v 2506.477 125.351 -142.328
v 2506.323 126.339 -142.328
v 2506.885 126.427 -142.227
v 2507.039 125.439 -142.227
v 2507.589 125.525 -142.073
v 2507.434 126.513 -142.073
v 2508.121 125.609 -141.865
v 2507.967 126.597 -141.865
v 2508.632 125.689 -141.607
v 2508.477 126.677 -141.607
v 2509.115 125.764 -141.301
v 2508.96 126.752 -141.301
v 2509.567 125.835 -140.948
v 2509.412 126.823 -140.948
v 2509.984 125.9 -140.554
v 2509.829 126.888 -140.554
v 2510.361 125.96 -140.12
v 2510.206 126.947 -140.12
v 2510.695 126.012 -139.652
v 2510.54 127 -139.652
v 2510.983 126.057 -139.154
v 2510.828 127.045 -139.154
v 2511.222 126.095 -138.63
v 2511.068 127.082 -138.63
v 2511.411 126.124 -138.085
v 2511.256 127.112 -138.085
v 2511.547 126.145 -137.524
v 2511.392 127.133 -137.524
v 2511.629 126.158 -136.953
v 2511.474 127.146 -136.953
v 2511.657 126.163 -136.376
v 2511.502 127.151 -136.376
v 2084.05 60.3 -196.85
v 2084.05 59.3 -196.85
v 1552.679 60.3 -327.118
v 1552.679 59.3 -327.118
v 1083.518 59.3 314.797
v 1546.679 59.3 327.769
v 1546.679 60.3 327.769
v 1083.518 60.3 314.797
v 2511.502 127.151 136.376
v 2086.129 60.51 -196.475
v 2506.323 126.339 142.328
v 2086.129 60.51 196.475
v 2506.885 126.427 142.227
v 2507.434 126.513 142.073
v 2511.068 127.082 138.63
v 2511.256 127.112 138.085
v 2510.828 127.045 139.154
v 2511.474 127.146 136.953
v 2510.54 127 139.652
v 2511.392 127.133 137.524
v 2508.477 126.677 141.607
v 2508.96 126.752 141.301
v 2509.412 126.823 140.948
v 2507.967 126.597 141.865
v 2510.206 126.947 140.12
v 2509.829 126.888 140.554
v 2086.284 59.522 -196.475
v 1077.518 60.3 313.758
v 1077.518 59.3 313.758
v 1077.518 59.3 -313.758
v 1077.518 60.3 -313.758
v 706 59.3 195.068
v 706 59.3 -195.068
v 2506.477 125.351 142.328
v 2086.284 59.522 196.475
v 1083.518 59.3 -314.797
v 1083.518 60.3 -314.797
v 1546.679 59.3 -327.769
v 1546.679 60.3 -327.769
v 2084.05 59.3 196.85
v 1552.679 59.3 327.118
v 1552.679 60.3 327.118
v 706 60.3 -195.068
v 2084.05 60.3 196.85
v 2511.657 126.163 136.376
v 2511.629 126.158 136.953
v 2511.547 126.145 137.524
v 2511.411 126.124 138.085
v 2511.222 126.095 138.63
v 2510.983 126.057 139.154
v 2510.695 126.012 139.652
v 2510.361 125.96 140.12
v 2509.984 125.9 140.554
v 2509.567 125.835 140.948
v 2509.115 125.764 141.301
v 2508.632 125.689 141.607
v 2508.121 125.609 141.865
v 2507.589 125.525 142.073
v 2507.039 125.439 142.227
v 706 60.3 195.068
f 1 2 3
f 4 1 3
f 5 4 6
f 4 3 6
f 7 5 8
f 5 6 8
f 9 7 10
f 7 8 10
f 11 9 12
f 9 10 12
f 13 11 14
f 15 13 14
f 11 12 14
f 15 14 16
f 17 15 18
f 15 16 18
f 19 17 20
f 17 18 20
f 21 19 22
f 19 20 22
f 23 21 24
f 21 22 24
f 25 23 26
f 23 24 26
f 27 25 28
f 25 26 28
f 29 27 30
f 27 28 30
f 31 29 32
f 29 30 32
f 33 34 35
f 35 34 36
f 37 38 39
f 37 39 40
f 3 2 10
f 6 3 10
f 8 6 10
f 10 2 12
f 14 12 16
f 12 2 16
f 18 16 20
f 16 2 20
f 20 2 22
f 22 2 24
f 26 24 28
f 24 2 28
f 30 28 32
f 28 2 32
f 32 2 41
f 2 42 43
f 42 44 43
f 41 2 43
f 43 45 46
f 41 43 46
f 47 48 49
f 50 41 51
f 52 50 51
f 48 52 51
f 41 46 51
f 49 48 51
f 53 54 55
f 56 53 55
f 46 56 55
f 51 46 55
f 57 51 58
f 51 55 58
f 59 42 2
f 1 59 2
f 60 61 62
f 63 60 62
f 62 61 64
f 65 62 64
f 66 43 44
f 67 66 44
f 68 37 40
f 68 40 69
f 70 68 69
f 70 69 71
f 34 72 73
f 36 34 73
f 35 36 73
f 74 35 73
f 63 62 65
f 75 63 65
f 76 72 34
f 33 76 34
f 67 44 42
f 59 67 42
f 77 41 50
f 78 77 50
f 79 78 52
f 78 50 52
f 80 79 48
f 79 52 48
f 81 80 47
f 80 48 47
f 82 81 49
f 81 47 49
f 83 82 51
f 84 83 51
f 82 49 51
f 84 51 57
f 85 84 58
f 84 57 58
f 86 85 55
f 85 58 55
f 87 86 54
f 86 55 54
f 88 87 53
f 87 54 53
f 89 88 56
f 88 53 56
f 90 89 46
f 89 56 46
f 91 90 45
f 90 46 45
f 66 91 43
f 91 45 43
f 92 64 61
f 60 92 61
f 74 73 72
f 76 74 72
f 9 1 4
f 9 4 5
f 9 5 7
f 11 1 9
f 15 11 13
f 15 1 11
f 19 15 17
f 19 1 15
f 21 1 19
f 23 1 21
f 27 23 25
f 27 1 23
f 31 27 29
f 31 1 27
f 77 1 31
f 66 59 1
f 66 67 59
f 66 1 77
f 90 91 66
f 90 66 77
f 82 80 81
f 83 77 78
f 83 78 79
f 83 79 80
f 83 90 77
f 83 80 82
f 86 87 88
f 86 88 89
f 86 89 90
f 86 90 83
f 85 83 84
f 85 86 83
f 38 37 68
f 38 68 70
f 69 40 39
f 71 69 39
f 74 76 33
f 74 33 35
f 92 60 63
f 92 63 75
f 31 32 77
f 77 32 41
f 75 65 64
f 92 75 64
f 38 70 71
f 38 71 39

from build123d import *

# Parameters (mm, degrees)
BOSS_EXTRUDE1_DEPTH         = 1
BOSS_EXTRUDE1_2_DEPTH       = 1
BOSS_EXTRUDE1_3_DEPTH       = 1
BOSS_EXTRUDEREARFLOOR_START = -1
BOSS_EXTRUDEREARFLOOR_DEPTH = 1


with BuildPart() as part:
    # Sketch1 → Boss-Extrude1 (new body)
    with BuildSketch(Plane.XZ.offset(-59.3)):
        Polygon((2084.05, 196.849875822), (2084.05, -196.849875822), (1552.679093518, -327.117712255), (1552.679093518, 327.117712255), align=None)
    extrude(amount=-BOSS_EXTRUDE1_DEPTH)


with BuildPart() as body_2:
    # Sketch1 → Boss-Extrude1 2 (new body)
    with BuildSketch(Plane.XZ.offset(-59.3)):
        Polygon((1083.51849794, 314.797366573), (1083.51849794, -314.797366573), (1546.679093518, -327.769153695), (1546.679093518, 327.769153694), align=None)
    extrude(amount=-BOSS_EXTRUDE1_2_DEPTH)


with BuildPart() as body_3:
    # Sketch1 → Boss-Extrude1 3 (new body)
    with BuildSketch(Plane.XZ.offset(-59.3)):
        Polygon((1077.51849794, 313.757852783), (1077.51849794, -313.757852783), (706, -195.067870365), (706, 195.067870365), align=None)
    extrude(amount=-BOSS_EXTRUDE1_3_DEPTH)


with BuildPart() as body_4:
    # Sketch2 → Boss-ExtrudeRearFloor (new body)
    with BuildSketch(Plane(origin=(40.876638844, -260.919378418, 0), x_dir=(0.987949588, 0.154776003, 0), z_dir=(0.154776003, -0.987949588, 0)).offset(BOSS_EXTRUDEREARFLOOR_START)):
        with BuildLine():
            Line((2070.355518515, -196.475045869), (2495.674764696, -142.327861196))
            ThreePointArc((2495.674764696, -142.327861196), (2499.419603214, -140.34160117), (2500.917023581, -136.375901149))
            Line((2500.917023581, -136.375901149), (2500.917023581, -58.444774641))
            Line((2500.917023581, -58.444774641), (2500.917023581, 58.444774641))
            Line((2500.917023581, 58.444774641), (2500.917023581, 136.375901149))
            ThreePointArc((2500.917023581, 136.375901149), (2499.419603214, 140.34160117), (2495.674764696, 142.327861196))
            Line((2495.674764696, 142.327861196), (2070.355518515, 196.475045869))
            Line((2070.355518515, 196.475045869), (2070.355518515, -196.475045869))
        make_face()
    extrude(amount=BOSS_EXTRUDEREARFLOOR_DEPTH)


solid = Compound([part.part, body_2.part, body_3.part, body_4.part])
